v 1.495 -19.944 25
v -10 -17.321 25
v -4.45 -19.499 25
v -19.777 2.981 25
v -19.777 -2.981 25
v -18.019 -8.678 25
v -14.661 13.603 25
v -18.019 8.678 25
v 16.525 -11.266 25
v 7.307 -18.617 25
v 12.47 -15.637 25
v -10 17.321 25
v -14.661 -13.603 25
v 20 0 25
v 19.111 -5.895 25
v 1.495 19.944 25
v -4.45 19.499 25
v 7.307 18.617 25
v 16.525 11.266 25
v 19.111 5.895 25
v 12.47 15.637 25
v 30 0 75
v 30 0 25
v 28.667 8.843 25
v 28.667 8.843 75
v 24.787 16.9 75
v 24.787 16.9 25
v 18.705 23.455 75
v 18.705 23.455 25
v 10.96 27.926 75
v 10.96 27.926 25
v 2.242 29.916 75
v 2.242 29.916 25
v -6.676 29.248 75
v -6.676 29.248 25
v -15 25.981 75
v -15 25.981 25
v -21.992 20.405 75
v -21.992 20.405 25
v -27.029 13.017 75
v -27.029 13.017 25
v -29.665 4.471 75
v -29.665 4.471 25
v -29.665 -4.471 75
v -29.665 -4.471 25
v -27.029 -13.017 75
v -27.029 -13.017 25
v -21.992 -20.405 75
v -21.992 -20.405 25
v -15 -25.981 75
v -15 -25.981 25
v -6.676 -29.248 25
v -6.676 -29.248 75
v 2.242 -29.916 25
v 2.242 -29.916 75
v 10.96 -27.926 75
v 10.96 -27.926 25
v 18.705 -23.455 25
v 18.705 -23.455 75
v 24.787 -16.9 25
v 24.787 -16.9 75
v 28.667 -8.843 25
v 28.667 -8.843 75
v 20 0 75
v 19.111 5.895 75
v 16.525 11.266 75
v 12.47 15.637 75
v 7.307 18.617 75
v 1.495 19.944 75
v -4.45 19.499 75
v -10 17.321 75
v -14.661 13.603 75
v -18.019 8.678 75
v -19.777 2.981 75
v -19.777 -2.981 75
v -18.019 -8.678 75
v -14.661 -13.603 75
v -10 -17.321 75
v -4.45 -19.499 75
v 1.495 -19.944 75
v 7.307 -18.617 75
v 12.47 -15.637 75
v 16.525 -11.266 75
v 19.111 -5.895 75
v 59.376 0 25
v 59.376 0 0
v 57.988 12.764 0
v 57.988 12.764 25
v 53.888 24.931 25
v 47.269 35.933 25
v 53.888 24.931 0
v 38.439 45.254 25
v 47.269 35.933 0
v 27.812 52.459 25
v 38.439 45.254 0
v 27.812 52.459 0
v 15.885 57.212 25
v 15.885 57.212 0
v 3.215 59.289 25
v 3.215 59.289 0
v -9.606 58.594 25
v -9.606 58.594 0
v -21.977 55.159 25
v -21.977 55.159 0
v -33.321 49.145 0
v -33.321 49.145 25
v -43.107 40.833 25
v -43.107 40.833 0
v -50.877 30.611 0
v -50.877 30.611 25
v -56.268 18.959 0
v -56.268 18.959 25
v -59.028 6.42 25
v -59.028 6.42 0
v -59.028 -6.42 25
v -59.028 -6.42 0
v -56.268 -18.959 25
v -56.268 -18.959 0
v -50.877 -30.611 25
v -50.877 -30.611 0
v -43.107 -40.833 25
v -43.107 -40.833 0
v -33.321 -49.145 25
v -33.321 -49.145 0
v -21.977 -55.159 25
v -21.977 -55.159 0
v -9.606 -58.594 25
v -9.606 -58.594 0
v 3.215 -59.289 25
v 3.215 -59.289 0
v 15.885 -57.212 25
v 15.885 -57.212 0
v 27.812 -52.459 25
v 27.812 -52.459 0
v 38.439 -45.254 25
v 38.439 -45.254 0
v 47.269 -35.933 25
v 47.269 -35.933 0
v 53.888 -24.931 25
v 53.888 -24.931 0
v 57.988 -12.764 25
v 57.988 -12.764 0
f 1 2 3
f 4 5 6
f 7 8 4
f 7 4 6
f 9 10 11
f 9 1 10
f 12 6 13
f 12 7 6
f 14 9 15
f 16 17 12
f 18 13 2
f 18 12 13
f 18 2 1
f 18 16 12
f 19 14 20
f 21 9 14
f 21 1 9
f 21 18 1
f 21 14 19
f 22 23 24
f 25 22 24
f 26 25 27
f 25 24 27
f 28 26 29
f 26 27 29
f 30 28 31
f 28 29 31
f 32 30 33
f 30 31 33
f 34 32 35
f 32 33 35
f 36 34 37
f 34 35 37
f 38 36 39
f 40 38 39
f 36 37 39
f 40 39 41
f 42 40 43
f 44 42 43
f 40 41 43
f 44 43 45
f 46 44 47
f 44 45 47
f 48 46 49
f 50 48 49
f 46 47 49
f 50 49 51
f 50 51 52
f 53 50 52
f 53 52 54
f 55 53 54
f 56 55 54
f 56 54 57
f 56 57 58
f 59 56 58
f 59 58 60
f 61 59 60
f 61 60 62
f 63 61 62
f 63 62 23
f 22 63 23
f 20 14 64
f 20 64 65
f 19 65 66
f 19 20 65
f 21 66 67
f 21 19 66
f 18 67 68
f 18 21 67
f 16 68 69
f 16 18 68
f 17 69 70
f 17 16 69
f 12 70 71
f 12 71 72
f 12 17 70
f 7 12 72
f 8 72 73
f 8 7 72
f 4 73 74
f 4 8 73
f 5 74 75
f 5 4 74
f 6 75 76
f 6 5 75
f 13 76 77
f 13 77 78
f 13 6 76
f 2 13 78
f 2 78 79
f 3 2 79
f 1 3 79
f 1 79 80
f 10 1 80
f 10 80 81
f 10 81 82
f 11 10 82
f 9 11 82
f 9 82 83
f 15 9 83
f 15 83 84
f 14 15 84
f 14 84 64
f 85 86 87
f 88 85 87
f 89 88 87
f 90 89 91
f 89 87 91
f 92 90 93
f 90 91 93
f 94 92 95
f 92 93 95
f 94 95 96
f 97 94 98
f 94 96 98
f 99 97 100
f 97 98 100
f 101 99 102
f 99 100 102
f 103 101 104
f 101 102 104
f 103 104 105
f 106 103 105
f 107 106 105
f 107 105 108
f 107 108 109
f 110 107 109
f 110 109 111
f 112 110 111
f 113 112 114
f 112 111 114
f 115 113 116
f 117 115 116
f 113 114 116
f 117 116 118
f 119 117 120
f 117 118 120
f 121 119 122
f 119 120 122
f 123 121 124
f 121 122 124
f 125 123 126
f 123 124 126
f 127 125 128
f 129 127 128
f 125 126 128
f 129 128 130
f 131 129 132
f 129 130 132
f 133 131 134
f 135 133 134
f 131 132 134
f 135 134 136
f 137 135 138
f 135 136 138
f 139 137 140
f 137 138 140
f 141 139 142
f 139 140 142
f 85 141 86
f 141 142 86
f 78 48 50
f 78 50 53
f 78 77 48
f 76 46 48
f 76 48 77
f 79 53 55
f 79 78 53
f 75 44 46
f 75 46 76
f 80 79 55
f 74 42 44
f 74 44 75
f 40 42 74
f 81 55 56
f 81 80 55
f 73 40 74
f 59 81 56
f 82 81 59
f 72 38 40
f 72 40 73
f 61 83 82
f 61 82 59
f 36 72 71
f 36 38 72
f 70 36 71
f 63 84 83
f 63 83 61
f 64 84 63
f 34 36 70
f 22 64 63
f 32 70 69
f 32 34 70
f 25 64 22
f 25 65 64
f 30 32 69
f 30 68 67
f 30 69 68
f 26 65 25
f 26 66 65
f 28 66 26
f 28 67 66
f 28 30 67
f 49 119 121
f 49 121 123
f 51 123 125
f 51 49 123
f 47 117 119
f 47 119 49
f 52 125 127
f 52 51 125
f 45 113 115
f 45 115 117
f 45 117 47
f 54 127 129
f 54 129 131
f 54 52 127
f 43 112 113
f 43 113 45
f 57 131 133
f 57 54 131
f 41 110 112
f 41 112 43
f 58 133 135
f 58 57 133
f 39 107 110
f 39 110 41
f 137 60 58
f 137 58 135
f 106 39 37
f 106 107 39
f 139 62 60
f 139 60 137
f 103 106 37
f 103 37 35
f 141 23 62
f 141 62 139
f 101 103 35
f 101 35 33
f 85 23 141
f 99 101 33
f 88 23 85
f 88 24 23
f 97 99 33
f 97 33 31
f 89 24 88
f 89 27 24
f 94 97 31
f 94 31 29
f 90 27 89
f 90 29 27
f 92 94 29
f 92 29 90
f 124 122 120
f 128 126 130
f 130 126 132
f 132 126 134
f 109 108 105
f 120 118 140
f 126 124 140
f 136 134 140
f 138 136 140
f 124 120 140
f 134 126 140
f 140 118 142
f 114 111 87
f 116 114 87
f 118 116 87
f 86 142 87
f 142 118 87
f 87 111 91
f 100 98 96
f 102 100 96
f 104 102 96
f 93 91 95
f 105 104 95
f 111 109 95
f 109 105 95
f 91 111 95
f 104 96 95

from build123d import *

# Parameters (mm, degrees)
F0_R     = 30
F1_DEPTH = 75
F2_R     = 20
F3_DEPTH = 75
F4_R     = 59.37587
F5_DEPTH = 25


with BuildPart() as f1:
    # F0 (on Top) → F1 (new body)
    with BuildSketch(Plane.XY):
        Circle(F0_R)
    extrude(amount=F1_DEPTH)

    # F2 (on Top) → F3 (cut, through all)
    with BuildSketch(Plane.XY):
        Circle(F2_R)
    extrude(amount=F3_DEPTH, mode=Mode.SUBTRACT)

    # F4 (on Top) → F5 (join)
    with BuildSketch(Plane.XY):
        Circle(F4_R)
    extrude(amount=F5_DEPTH)


solid = f1.part
